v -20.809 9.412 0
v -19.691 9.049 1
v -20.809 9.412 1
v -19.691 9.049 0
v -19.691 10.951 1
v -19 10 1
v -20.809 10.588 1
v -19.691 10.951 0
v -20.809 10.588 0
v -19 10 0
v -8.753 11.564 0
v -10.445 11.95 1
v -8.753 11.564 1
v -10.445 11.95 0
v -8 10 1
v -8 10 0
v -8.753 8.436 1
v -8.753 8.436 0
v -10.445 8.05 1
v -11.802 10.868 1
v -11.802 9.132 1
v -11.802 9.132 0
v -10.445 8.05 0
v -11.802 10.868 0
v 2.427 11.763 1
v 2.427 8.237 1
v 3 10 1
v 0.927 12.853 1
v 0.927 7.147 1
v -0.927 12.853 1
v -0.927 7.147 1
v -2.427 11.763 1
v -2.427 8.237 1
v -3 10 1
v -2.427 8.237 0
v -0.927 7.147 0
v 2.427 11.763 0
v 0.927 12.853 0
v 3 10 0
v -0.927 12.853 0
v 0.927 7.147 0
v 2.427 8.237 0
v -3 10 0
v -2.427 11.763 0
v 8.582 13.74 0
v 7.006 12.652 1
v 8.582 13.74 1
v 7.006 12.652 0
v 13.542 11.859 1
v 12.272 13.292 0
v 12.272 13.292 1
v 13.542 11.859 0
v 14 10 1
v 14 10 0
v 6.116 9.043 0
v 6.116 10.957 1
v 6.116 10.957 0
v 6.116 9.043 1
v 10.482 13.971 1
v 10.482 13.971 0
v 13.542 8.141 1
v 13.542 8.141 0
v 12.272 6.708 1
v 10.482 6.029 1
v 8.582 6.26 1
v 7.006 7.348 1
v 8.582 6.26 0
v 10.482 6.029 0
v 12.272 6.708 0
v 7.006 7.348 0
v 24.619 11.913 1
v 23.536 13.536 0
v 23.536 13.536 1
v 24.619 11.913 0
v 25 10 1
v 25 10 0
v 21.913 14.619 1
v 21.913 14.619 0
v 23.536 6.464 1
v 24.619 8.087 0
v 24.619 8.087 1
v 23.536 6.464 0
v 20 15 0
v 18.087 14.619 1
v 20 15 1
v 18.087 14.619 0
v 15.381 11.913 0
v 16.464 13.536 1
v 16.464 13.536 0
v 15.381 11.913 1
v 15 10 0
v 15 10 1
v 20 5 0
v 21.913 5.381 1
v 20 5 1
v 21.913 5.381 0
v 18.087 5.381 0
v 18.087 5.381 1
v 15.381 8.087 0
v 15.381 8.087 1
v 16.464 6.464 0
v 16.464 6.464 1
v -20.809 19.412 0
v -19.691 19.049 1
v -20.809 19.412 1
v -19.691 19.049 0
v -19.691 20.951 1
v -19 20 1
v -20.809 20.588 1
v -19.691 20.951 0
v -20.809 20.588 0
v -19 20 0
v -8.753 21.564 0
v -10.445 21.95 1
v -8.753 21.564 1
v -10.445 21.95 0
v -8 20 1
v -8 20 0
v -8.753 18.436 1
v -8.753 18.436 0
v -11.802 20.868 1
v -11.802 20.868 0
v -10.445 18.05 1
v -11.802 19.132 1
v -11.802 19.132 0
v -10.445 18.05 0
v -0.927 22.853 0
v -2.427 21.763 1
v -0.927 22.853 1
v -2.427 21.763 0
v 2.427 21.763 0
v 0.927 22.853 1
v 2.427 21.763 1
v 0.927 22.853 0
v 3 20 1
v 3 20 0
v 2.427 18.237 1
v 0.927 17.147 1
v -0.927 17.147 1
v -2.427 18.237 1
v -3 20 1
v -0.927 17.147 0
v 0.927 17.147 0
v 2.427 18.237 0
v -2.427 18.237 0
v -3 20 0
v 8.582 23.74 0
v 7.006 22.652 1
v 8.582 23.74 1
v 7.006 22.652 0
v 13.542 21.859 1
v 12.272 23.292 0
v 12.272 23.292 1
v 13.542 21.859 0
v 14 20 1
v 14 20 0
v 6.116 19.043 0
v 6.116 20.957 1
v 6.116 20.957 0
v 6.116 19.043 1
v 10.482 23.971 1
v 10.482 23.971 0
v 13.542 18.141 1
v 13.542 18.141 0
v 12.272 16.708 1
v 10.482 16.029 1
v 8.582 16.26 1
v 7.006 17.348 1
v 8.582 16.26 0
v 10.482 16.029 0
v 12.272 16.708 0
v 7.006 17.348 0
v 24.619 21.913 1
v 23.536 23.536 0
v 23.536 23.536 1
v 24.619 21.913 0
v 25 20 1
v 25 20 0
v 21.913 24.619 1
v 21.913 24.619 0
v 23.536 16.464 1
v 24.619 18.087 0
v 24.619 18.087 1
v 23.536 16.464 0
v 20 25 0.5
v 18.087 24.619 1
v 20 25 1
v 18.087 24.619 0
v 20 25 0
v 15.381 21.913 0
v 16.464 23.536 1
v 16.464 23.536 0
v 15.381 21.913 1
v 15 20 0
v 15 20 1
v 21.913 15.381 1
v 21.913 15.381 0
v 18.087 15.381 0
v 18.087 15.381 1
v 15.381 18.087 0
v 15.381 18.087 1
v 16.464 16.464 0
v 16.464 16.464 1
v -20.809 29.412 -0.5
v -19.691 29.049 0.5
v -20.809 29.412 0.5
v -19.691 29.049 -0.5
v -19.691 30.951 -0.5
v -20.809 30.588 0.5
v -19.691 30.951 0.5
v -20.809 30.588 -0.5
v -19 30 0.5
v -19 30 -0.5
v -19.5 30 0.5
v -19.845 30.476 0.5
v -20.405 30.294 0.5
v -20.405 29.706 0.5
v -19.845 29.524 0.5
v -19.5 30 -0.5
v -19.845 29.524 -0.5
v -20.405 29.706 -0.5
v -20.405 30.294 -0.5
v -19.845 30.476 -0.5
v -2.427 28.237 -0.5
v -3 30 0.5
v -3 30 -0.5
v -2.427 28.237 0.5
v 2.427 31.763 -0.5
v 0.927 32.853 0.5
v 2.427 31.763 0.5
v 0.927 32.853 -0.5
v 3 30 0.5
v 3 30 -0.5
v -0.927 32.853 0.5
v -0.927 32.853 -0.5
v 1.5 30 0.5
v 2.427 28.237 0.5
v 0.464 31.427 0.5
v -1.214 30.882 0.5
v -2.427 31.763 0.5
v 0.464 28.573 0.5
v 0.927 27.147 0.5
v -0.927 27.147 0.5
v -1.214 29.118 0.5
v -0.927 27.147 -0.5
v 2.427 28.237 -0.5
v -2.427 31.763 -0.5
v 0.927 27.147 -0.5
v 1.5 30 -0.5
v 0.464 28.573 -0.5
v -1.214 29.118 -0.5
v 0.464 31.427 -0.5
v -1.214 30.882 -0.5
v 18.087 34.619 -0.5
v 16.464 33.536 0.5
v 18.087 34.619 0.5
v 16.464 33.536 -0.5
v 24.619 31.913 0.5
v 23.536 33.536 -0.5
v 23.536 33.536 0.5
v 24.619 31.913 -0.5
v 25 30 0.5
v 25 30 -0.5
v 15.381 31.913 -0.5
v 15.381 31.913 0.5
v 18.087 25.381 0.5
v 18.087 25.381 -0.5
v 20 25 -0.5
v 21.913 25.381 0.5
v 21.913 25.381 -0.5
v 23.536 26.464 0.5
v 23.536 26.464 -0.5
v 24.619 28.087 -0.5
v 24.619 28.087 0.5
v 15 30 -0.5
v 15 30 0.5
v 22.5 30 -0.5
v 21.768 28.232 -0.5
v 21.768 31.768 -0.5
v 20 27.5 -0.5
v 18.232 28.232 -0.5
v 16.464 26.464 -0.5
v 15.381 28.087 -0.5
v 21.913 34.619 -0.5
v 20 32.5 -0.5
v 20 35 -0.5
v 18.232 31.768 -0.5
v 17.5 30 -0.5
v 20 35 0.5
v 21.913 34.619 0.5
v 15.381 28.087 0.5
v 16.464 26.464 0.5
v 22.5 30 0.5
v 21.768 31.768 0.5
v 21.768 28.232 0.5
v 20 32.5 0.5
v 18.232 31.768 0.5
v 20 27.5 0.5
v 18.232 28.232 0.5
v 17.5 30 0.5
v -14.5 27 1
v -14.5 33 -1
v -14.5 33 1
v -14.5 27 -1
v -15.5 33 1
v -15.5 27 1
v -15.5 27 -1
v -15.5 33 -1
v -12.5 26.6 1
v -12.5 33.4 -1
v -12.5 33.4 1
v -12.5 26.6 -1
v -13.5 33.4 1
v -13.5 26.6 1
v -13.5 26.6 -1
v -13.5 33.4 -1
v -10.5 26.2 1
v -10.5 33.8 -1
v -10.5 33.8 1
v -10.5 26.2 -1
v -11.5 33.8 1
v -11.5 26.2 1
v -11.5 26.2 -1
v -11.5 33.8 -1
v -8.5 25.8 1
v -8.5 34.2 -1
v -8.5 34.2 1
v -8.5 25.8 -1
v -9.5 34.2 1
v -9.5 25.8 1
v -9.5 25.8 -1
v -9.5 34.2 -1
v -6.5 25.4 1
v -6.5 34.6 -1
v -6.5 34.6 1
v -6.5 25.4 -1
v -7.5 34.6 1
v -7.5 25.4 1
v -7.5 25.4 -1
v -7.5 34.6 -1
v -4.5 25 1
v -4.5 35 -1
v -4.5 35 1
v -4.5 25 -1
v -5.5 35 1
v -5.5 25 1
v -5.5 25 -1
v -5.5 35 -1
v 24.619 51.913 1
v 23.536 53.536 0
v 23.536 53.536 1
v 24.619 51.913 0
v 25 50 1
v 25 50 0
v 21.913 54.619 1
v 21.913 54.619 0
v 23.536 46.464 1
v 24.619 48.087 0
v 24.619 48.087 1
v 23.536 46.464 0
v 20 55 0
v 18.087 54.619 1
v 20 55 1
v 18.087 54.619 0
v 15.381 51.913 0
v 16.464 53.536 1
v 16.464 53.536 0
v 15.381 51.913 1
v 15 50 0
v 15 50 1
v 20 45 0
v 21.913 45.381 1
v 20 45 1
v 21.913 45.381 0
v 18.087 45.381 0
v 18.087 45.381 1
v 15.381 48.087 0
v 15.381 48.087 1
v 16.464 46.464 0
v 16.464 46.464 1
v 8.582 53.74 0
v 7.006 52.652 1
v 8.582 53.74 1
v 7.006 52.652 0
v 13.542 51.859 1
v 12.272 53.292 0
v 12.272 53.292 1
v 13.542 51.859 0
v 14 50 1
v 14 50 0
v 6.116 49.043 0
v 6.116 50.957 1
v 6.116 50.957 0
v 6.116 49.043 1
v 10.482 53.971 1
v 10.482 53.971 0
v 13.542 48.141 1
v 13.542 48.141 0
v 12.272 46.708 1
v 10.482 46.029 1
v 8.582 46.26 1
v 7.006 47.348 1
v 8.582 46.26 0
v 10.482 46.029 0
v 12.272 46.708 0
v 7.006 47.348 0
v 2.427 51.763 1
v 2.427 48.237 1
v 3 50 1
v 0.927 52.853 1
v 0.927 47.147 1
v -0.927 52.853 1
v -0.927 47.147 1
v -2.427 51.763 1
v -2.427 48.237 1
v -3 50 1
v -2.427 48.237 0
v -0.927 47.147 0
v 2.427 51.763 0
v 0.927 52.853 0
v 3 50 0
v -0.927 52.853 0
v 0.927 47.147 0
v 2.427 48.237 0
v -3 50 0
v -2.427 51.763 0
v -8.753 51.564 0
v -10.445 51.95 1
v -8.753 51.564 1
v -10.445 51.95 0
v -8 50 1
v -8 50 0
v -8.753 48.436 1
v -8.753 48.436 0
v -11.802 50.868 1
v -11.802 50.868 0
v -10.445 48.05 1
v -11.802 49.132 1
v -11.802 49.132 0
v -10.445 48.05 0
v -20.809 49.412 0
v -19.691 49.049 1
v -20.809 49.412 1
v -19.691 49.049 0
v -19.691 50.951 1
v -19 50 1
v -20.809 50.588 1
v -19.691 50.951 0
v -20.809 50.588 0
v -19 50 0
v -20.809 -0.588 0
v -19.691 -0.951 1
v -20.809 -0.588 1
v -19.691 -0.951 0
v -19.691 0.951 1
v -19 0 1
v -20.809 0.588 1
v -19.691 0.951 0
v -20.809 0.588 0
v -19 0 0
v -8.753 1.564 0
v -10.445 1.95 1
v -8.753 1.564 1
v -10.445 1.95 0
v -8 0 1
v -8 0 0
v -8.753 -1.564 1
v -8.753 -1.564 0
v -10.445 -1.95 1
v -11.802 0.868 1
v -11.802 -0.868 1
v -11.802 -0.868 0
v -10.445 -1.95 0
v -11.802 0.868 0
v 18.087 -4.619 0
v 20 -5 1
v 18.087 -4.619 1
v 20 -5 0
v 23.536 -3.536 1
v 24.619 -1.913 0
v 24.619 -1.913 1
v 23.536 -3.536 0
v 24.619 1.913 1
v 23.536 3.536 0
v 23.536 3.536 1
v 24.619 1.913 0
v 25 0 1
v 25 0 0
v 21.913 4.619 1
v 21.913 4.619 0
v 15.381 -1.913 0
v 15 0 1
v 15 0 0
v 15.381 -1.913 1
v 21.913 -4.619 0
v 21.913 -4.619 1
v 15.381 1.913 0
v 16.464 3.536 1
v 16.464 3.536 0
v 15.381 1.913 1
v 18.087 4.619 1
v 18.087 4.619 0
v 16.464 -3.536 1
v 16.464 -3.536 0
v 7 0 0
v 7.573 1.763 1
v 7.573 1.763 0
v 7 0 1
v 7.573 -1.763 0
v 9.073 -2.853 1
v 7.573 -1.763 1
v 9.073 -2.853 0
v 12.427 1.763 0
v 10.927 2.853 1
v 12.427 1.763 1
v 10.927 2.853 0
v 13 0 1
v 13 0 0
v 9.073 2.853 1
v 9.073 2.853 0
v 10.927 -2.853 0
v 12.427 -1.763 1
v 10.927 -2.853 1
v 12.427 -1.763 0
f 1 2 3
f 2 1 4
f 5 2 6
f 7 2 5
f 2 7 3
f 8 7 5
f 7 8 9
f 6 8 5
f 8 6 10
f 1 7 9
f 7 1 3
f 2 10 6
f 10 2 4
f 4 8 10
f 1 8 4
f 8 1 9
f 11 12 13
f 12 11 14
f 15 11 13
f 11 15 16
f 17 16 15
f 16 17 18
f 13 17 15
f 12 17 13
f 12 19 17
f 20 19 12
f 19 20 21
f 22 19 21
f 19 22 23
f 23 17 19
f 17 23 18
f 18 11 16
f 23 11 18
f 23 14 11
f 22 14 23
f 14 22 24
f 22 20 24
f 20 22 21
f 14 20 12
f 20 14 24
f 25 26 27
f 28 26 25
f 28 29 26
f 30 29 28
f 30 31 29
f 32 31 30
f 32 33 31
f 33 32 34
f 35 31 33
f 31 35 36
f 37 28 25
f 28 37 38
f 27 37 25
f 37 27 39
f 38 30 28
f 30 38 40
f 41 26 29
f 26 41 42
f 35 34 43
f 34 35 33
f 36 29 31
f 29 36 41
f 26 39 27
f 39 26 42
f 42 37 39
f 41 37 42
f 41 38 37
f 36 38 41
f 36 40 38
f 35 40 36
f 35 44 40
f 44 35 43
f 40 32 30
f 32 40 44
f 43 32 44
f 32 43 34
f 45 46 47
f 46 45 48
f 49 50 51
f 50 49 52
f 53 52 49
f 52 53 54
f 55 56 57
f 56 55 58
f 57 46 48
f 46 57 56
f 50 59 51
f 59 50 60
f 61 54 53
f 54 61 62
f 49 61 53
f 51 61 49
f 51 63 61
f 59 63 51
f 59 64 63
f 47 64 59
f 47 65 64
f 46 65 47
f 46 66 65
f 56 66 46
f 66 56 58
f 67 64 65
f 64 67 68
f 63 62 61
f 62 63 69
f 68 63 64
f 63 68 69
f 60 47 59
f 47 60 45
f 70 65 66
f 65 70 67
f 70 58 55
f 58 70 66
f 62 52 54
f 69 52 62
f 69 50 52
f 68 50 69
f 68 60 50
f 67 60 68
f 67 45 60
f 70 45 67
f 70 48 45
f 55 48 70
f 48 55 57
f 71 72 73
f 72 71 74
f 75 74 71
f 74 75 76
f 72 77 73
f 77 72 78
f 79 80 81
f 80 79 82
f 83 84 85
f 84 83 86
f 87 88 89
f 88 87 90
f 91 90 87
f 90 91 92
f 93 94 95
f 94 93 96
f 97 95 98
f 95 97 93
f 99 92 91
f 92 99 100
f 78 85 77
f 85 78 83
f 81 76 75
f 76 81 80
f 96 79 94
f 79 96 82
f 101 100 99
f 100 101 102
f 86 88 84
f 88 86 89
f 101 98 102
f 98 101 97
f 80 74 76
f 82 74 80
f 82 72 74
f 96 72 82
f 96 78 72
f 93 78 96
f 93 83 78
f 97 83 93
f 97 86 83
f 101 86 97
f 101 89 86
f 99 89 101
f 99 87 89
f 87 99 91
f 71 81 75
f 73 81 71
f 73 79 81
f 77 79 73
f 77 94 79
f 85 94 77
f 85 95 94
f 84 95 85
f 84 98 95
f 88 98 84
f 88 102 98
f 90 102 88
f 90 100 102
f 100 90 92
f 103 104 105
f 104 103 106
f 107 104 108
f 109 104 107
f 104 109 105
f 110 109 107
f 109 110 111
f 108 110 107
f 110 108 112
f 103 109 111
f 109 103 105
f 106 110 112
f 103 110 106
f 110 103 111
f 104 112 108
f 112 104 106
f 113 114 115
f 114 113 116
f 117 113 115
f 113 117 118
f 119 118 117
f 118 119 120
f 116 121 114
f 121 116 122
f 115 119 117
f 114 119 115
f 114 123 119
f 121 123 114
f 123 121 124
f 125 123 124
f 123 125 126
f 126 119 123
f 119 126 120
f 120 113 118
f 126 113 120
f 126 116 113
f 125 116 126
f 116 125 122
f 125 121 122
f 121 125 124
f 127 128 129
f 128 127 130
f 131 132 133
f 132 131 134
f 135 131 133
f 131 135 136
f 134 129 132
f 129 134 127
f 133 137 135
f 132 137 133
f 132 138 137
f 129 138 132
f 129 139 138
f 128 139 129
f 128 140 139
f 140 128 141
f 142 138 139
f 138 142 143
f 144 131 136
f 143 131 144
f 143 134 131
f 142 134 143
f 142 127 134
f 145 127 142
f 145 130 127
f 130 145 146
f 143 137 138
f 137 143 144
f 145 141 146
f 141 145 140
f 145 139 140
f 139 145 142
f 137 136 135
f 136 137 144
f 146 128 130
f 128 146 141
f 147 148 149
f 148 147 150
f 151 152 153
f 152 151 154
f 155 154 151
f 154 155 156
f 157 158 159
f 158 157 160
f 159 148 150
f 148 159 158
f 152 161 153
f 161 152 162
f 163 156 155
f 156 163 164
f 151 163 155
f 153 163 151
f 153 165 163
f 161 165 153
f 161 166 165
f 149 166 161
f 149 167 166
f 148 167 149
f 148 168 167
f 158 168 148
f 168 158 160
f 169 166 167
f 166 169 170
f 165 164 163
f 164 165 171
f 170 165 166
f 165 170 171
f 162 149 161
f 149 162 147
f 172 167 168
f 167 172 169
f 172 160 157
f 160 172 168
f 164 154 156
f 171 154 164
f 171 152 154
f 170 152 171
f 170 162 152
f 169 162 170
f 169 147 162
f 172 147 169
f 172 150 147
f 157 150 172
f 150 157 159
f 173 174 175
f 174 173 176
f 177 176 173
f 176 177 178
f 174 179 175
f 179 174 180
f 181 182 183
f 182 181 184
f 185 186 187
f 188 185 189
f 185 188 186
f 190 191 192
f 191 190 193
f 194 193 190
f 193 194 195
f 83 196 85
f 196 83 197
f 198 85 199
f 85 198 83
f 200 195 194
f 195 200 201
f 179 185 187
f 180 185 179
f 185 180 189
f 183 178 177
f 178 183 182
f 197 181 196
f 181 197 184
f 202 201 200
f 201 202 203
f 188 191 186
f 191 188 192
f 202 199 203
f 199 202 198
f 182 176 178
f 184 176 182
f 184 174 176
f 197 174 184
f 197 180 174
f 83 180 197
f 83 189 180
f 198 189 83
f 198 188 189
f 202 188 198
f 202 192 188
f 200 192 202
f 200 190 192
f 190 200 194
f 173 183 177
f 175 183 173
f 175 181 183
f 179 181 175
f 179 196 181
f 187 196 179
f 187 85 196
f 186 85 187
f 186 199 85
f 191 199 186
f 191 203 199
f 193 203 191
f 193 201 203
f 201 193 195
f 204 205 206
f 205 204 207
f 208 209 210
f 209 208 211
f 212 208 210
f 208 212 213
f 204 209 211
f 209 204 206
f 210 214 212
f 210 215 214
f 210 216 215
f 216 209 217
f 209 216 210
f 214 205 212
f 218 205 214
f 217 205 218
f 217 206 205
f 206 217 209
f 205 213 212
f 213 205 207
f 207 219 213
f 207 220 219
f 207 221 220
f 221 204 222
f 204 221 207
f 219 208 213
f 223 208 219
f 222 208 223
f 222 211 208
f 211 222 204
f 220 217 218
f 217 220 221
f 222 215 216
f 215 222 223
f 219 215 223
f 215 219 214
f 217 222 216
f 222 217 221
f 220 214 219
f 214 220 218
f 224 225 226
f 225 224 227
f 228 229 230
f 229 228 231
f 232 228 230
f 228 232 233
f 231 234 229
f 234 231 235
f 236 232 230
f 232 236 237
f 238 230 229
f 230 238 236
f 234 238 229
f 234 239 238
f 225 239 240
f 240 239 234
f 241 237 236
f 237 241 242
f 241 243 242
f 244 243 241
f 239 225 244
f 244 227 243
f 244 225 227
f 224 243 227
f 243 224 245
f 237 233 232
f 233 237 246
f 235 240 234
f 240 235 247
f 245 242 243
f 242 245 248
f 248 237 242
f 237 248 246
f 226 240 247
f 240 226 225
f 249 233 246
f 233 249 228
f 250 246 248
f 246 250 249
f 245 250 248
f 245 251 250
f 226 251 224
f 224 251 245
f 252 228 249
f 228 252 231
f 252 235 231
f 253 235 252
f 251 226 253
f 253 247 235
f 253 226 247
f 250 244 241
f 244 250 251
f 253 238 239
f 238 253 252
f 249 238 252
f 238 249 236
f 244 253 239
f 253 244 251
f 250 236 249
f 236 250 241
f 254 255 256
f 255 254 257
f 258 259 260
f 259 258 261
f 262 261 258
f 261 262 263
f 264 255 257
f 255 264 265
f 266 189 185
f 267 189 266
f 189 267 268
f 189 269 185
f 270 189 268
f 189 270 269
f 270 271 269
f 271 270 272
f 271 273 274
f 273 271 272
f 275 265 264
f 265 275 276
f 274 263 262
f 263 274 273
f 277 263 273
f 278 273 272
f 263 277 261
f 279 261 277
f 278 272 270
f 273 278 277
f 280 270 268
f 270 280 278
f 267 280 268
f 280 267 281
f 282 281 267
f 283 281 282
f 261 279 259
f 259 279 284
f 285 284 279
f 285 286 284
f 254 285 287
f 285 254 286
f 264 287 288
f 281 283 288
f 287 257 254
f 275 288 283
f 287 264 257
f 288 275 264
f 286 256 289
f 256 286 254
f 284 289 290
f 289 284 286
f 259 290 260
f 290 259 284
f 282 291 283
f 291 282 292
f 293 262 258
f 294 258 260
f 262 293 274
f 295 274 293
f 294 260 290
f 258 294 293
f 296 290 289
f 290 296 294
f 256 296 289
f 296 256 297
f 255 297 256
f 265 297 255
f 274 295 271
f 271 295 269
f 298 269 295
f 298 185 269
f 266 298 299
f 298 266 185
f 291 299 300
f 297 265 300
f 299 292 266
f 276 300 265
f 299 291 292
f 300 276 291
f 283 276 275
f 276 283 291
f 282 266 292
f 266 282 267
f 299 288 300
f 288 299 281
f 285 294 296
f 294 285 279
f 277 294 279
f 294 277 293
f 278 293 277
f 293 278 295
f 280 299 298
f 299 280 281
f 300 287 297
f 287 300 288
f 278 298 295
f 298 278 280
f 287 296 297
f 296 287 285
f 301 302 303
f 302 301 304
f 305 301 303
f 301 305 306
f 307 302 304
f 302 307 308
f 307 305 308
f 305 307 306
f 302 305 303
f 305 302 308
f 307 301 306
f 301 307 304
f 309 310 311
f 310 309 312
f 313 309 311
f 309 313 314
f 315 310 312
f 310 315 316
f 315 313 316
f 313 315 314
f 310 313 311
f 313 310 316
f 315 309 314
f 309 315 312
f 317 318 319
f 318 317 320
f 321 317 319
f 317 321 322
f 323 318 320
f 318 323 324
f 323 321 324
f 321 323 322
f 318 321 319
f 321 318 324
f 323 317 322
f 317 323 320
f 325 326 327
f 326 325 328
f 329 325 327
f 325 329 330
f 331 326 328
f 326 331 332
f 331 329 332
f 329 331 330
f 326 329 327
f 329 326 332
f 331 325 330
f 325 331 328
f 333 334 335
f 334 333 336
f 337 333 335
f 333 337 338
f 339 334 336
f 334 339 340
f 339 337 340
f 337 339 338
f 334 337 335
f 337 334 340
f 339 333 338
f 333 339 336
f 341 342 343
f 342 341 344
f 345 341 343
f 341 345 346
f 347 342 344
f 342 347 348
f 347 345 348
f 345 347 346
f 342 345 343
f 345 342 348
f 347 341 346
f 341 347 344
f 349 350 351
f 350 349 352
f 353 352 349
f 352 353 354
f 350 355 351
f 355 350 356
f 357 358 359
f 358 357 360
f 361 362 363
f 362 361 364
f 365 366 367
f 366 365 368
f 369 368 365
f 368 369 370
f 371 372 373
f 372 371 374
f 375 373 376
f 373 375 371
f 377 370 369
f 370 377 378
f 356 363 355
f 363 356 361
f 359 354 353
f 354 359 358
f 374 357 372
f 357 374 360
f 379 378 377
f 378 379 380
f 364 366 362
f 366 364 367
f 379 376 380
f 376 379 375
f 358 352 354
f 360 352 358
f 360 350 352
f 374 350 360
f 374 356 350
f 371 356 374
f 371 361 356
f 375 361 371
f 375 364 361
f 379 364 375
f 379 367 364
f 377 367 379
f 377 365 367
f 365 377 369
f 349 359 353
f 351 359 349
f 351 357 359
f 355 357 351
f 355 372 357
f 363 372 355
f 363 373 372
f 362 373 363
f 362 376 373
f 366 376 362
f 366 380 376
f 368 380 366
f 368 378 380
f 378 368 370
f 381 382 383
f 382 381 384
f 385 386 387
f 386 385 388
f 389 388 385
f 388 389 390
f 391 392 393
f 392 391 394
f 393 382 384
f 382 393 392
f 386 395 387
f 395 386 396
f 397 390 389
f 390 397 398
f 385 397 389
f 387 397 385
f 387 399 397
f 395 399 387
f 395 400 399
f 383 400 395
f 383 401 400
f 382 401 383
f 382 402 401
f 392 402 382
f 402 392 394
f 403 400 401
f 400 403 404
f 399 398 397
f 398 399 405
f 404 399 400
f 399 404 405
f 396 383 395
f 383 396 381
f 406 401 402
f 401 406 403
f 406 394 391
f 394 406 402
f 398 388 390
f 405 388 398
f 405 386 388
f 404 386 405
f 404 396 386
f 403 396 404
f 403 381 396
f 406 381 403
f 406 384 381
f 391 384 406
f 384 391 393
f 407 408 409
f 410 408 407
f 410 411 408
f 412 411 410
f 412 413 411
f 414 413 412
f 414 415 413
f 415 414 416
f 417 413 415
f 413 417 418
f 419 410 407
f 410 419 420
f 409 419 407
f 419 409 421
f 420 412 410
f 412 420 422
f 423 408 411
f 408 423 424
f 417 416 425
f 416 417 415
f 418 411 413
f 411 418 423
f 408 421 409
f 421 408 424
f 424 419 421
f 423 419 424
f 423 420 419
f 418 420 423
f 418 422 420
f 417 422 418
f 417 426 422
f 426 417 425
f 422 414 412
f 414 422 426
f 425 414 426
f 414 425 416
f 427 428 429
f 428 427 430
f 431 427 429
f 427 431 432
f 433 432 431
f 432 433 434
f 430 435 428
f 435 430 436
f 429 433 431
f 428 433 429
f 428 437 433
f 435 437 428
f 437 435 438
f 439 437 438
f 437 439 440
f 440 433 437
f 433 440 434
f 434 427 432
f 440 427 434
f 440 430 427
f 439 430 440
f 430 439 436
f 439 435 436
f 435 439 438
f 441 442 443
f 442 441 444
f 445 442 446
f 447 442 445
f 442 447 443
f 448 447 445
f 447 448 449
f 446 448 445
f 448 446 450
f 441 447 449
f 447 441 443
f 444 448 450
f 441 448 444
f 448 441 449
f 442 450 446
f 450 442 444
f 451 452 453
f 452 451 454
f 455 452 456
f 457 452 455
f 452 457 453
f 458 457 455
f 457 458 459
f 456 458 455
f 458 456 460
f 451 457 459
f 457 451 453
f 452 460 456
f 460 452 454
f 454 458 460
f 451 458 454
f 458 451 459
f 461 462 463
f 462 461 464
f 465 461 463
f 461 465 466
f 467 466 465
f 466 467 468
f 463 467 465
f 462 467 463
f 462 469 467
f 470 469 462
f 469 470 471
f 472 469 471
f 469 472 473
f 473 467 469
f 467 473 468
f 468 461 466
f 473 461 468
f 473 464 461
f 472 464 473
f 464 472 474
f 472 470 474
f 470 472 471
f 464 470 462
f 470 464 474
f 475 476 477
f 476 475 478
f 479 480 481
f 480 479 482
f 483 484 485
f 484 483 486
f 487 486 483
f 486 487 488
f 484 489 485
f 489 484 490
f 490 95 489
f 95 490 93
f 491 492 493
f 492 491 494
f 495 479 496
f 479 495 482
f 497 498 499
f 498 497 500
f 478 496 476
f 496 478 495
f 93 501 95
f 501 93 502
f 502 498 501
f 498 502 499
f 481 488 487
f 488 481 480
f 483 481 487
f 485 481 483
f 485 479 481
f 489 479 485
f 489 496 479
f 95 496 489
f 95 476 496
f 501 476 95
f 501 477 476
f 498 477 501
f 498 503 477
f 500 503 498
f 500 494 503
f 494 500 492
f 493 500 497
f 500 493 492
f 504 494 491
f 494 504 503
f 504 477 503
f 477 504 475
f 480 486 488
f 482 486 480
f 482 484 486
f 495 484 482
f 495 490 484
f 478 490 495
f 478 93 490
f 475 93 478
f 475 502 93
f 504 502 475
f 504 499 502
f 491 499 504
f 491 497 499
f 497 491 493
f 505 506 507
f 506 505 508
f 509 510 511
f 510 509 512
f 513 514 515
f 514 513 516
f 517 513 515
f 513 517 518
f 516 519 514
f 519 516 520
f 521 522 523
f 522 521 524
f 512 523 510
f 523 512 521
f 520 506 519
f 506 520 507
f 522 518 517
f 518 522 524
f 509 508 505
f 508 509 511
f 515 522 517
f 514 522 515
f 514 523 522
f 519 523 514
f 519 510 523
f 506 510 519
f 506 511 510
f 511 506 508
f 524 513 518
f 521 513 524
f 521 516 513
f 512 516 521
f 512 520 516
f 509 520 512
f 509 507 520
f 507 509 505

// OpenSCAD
// Volume: 623.3356187720594, SurfaceArea: 1702.4918360584816
// Empty
for();
// No children
for(i=2) { }
// Modifier and no children
%for(i=2) { }
#for(i=2) { }

// Null
translate([-10,0,0]) for() cylinder(r=4);

// Scalar
translate([10,0,0]) for(i=3) cylinder(r=i);

// Range
for(r=[1:5]) translate([r*10-30,10,0]) cylinder(r=r);

// Reverse
for(r=[5:1]) translate([r*10-30,20,0]) cylinder(r=r);

// Step
for(r=[1:2:6]) translate([r*10-30,30,0]) difference() {cylinder(r=r, center=true); cylinder(r=r/2, h=2, center=true);}

// Fractional step
for(r=[1.5:0.2:2.5]) translate([r*10-30,30,0]) cube([1, 4*r, 2], center=true);

// Negative range, negative step
for(r=[5:-1:1]) translate([r*10-30,50,0]) cylinder(r=r);

// Negative range, positive step
for(r=[5:1:1]) translate([r*10-30,40,0]) cylinder(r=r);

// Zero step

for(r=[1:0:5]) translate([r*10+60,40,0]) cylinder(r=r);

// Negative step
for(r=[1:-1:5]) translate([r*10-30,50,0]) cylinder(r=r);

// Illegal step value
for(r=[1:true:5]) translate([r*10-60,50,0]) cylinder(r=r);

// Vector
for(r=[1,2,5]) translate([r*10-30,0,0]) cylinder(r=r);

// String
for(c="") echo("never shown");
for(c="a\u2191b\U01f600") echo(c);

nan = 0/0;
inf = 1/0;
ninf = -1/0;

echo(nan);
echo(inf);
echo(ninf);

// validate step values
for(i=[0:nan:0]) { echo("NAN", i); }
for(i=[0:inf:0]) { echo("INF", i); }
for(i=[0:ninf:0]) { echo("-INF", i); }

for(i=[0:nan:1]) { echo("NAN", i); }
for(i=[0:inf:1]) { echo("INF", i); }
for(i=[0:ninf:1]) { echo("-INF", i); }

for(i=[1:nan:0]) { echo("NAN", i); }
for(i=[1:inf:0]) { echo("INF", i); }
for(i=[1:ninf:0]) { echo("-INF", i); }

// validate begin / end values
for(i = [0:inf]) {}
for(i = [0:ninf]) {}      // empty set
for(i = [inf:0]) {}       // empty set
for(i = [ninf:0]) {}

for(i = [0:2:inf]) {}
for(i = [0:2:ninf]) {}    // 0 values, begin > end
for(i = [inf:2:0]) {}     // 0 values, begin > end
for(i = [ninf:2:0]) {}
for(i = [inf:2:inf]) {}   // 1 value,  begin == end
for(i = [ninf:2:ninf]) {} // 1 value,  begin == end
for(i = [inf:2:ninf]) {}  // 0 values, begin > end
for(i = [ninf:2:inf]) {}

module PathologicalInputs() {
  // Expected:  too many elements
  // Actual:  0
  echo("[0:1:4294967296] end capped");
  for (i=[0:1:4294967296]) { if ((i<2) || (i>=4294967295)) {echo(i);} }

  // Expected:  too many elements
  // Actual:  0
  echo("[0:1:8589934592] end capped");
  for (i=[0:1:8589934592]) { if ((i<2) || (i>=8589934592)) {echo(i);} }

  // Expected:  0, 1, 4294967294, 4294967295  or too many inputs
  // Actual:  no output
  echo("[0:1:4294967295] end capped");
  for (i=[0:1:4294967295]) { if ((i<2) || (i>=4294967294)) {echo(i);} }

  // Expected:  0, 1, 4294967293, 4294967294  or too many inputs
  // Actual:  too many elements (4294967295)
  // Note:  Oddly inconsistent with the 0:42949679295 case right above.
  echo("[0:1:4294967294] end capped");
  for (i=[0:1:4294967294]) { if ((i<2) || (i>=4294967293)) {echo(i);} }

  // Expected:  0, 1, 4999, 5000
  // Correct
  echo("[0:1:5000] end capped");
  for (i=[0:1:5000]) { if ((i<2) || (i>=4999)) {echo(i);} }

  // Expected:  "diff=0, i==1", "diff=0, i=5000"
  // Correct
  echo("[0:1:5000] difference from 1, 5000");
  for (i=[0:1:5000]) {
    if ((i>0.5)&&(i<1.5)) {
      echo("diff=", i-1, (i==1)?", i==1":", i!=1");
    }
    if (i>4999) {
      echo("diff=", i-5000, (i==5000)?", i==5000":", i!=5000");
    }
  }

  // Expected:  "diff=0, i==1", "diff=0, i=5000"
  // Correct
  echo("[0:1:5000] difference from 1, 5000");
  for (i=[0:1:5000]) {
    if ((i>0.5)&&(i<1.5)) {
      echo("diff=", i-1, (i==1)?", i==1":", i!=1");
    }
    if (i>4999) {
      echo("diff=", i-5000, (i==5000)?", i==5000":", i!=5000");
    }
  }

  // Expected:  "diff=0, i==1"
  // Correct
  echo("[0:1] difference from 1");
  for (i=[0:1])
    if (i>0) {
      echo("diff=", i-1, (i==1)?", i==1":", i!=1");
    }
}

PathologicalInputs();
